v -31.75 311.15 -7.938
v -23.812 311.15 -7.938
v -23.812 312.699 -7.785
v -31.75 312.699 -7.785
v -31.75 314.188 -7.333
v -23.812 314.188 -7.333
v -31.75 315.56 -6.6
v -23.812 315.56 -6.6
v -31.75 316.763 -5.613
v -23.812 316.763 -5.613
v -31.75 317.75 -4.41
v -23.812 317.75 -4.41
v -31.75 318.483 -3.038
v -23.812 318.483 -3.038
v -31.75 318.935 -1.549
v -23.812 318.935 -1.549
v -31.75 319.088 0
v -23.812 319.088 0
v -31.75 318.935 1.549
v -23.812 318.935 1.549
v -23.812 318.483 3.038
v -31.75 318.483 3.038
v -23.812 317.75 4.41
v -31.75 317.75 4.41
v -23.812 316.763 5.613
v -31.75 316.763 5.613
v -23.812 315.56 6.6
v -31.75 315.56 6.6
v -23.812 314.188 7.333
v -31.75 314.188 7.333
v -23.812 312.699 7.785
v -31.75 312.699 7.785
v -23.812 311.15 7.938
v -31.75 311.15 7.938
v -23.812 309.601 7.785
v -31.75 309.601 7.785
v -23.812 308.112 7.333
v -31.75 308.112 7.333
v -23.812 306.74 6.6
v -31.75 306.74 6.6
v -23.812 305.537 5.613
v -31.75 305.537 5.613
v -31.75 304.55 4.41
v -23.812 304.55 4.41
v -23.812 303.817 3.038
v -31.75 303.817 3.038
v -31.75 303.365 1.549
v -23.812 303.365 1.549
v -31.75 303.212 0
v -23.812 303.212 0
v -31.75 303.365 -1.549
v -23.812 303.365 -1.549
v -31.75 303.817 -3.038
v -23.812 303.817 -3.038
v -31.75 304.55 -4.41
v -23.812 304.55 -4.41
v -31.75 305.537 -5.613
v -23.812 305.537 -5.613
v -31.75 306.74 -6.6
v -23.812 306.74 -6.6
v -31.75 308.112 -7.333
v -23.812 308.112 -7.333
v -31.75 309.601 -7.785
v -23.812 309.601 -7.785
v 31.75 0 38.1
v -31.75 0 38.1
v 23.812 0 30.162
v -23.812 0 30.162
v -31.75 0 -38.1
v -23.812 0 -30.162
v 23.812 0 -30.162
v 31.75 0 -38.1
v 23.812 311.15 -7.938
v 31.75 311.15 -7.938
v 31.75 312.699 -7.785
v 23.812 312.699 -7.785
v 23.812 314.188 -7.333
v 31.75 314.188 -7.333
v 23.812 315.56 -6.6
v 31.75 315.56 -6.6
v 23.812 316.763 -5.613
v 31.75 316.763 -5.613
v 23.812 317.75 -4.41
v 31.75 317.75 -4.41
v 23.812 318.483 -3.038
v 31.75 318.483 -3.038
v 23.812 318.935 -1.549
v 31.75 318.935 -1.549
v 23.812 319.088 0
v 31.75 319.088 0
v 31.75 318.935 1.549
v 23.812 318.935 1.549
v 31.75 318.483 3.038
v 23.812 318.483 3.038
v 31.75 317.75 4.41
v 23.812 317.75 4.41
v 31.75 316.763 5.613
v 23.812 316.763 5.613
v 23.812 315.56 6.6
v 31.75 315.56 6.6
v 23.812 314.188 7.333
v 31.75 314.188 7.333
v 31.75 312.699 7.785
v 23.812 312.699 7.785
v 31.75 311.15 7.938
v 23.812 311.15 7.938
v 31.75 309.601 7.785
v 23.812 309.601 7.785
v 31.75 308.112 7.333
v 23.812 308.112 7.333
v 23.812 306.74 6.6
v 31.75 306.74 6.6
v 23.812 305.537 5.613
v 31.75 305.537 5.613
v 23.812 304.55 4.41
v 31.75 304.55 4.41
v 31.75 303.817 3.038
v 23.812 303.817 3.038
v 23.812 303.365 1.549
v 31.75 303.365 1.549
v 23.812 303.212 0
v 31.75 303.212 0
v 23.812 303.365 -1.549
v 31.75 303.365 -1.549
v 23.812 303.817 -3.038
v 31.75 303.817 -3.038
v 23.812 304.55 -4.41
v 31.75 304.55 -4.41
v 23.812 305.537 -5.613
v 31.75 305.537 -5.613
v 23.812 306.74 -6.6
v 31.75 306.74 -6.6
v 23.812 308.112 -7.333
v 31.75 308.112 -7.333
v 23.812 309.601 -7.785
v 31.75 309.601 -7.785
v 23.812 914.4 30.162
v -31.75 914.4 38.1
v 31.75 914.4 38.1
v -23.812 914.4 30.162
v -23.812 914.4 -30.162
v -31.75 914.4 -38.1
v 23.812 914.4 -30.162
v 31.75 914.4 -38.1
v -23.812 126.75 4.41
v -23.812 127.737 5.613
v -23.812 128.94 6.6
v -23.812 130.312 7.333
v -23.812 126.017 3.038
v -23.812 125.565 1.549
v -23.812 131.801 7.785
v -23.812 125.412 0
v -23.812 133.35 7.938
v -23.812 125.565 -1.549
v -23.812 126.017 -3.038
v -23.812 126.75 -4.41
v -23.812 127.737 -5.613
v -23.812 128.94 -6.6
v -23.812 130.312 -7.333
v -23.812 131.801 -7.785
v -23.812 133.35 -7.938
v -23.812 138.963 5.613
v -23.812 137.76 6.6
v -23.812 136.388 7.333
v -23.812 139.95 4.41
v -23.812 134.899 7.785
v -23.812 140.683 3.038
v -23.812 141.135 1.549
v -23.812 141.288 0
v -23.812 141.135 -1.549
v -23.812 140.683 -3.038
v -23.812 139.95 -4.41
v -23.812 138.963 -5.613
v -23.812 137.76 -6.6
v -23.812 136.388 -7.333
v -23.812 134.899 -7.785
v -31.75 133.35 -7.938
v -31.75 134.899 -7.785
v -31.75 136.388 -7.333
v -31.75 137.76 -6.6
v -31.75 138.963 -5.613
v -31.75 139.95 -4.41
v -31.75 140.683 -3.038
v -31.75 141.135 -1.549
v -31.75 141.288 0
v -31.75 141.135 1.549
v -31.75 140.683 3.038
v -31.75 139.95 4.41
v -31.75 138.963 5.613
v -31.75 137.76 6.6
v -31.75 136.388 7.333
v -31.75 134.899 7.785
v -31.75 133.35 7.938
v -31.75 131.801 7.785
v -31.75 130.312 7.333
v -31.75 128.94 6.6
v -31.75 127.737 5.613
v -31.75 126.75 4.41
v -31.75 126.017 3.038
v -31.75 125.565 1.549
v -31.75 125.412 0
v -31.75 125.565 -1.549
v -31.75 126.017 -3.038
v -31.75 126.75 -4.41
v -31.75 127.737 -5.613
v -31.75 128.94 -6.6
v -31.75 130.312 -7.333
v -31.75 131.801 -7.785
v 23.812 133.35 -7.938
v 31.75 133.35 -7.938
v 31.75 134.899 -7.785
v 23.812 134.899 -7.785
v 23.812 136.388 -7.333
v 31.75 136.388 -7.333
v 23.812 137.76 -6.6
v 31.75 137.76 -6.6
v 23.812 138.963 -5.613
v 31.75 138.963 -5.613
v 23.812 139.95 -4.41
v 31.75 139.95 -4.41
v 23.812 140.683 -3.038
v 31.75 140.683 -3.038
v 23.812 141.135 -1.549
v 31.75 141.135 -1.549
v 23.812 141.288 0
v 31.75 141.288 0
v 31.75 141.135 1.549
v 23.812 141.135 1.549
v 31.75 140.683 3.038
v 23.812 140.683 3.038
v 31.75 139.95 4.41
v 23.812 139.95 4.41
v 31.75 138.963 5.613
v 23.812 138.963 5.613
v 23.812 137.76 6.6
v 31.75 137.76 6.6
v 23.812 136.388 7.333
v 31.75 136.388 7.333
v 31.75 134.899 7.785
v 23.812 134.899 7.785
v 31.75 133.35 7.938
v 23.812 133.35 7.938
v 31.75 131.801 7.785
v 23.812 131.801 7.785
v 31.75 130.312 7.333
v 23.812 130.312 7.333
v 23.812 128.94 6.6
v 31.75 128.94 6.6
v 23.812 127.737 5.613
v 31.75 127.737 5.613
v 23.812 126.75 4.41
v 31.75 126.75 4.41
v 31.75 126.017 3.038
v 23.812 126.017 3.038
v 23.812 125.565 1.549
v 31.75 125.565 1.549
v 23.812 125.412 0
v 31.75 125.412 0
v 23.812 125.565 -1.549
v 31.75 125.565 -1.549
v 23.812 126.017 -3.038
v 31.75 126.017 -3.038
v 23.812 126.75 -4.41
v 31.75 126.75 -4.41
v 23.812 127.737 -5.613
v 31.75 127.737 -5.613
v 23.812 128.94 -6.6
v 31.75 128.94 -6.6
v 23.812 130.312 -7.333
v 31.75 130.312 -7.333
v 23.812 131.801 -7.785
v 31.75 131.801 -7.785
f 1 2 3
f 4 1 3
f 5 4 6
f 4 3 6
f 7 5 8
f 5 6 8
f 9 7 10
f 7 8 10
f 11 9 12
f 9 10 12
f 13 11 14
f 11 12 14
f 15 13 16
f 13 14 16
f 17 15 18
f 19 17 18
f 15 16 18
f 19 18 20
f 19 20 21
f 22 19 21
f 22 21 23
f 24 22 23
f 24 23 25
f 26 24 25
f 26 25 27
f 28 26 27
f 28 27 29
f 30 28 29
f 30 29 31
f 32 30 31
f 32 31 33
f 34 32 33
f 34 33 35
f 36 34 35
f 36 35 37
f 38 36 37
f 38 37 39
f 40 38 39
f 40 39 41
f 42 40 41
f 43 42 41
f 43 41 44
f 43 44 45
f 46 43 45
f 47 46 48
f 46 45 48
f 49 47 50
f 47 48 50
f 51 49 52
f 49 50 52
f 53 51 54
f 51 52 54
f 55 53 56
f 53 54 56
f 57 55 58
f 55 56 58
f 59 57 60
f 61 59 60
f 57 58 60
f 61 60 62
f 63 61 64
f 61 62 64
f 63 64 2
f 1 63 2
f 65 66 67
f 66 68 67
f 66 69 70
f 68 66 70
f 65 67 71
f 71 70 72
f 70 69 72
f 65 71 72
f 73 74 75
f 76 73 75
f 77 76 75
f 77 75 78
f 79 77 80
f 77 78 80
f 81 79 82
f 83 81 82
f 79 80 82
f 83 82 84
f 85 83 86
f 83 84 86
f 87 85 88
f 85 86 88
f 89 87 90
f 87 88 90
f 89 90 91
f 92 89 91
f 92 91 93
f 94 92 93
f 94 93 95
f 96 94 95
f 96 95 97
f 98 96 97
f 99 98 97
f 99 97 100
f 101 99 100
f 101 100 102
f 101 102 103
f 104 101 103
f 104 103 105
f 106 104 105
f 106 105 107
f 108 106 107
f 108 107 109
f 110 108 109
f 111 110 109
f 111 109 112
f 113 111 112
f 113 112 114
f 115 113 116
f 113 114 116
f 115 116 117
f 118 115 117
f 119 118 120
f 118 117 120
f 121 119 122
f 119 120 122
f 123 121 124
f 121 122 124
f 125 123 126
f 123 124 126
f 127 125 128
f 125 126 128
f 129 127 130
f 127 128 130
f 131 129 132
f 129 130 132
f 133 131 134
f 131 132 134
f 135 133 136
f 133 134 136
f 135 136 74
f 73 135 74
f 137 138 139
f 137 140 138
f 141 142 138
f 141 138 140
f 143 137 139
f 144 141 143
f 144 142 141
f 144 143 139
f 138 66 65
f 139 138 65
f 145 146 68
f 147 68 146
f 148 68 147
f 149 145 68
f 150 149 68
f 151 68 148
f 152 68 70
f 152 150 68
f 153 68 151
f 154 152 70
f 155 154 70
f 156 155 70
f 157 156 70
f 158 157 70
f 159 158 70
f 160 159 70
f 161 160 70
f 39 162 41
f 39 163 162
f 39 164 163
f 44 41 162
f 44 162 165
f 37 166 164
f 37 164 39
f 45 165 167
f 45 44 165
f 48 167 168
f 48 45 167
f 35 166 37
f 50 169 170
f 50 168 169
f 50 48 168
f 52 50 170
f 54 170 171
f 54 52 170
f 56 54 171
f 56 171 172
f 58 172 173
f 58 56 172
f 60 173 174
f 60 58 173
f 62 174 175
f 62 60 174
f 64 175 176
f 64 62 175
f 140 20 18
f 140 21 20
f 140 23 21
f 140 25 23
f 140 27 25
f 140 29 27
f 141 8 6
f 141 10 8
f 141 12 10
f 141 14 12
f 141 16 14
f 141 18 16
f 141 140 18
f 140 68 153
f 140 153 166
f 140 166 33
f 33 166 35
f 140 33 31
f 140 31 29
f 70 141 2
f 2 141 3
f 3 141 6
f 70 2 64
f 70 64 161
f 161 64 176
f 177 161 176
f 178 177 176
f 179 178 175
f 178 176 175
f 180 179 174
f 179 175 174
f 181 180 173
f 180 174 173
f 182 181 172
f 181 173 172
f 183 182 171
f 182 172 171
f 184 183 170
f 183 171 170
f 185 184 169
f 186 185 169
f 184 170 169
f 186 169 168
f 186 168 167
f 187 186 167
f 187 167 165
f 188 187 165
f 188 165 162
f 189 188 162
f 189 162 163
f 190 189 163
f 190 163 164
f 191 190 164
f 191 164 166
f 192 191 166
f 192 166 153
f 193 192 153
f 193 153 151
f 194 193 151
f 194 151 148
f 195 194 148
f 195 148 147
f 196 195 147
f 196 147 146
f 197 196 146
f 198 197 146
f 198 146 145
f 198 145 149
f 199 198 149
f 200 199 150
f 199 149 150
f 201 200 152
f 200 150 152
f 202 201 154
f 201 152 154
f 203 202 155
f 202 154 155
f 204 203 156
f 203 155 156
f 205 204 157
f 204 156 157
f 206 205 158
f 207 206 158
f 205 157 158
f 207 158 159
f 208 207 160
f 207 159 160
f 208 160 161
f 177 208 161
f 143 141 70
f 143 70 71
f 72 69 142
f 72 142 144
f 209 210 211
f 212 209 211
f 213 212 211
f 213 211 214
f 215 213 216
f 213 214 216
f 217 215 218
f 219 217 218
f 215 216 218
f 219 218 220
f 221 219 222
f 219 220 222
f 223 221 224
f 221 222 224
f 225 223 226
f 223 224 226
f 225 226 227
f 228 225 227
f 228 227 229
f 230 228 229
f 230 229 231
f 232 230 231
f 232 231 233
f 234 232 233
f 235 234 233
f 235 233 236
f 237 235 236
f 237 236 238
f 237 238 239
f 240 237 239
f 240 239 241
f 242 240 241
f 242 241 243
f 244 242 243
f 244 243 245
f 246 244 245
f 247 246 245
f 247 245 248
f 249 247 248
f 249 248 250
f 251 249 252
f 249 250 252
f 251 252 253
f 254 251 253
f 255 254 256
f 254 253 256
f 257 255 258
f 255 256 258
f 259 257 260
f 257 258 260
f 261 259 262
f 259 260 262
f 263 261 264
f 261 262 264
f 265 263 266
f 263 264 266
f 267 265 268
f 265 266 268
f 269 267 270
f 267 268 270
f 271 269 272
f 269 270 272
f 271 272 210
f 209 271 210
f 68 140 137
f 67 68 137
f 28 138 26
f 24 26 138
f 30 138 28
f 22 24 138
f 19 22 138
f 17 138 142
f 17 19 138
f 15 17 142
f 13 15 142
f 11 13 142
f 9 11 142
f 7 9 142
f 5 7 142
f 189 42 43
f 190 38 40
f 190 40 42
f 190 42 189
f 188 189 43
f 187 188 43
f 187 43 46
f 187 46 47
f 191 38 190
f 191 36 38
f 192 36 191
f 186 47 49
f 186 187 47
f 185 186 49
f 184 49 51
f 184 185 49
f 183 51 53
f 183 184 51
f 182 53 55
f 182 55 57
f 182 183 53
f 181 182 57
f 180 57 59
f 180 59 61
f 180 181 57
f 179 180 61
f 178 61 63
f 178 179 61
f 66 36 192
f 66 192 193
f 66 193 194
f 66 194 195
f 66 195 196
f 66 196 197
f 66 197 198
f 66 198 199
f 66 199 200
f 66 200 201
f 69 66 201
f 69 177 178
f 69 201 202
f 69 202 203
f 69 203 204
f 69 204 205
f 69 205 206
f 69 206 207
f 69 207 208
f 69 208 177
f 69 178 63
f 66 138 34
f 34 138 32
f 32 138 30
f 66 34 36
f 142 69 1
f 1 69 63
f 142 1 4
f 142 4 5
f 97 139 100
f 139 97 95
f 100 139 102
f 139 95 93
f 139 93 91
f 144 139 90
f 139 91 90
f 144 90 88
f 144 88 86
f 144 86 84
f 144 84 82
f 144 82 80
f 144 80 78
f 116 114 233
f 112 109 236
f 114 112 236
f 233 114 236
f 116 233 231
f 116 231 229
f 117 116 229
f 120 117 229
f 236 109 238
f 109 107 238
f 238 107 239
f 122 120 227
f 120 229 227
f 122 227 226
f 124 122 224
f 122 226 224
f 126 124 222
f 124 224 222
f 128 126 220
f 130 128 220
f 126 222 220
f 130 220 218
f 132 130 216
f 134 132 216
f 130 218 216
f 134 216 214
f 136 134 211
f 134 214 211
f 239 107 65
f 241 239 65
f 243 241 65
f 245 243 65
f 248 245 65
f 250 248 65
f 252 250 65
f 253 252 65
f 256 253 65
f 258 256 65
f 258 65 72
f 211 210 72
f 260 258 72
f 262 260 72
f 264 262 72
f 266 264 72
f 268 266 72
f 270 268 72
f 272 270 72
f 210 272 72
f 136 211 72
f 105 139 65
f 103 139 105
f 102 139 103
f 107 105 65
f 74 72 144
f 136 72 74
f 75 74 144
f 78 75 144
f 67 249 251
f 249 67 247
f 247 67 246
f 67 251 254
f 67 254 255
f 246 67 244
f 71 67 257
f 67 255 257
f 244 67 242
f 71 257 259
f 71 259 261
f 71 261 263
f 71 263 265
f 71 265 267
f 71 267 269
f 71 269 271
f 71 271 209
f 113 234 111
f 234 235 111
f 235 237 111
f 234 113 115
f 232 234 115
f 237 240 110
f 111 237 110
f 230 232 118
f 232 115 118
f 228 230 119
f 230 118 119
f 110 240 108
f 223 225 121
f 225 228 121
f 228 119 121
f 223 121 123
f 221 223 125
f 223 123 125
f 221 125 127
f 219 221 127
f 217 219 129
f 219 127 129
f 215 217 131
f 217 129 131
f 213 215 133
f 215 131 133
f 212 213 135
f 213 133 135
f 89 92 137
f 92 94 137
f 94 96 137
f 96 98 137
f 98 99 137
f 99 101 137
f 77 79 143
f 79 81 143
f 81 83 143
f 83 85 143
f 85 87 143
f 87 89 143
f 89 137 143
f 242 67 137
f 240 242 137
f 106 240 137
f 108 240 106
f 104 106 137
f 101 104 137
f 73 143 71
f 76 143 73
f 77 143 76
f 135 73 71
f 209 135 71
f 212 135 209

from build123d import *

# Parameters (mm, degrees)
SKETCH1_W           = 63.5
SKETCH1_H           = 76.2
BOSS_EXTRUDE1_DEPTH = 914.4
SKETCH2_W           = 47.625
SKETCH2_H           = 60.325
CUT_EXTRUDE1_DEPTH  = 916.743977594
SKETCH3_R           = 7.9375
CUT_EXTRUDE2_DEPTH  = 918.393710465


with BuildPart() as part:
    # Sketch1 → Boss-Extrude1 (new body)
    with BuildSketch(Plane(origin=(0, 0, 0), x_dir=(1, 0, 0), z_dir=(0, 1, 0))):
        Rectangle(SKETCH1_W, SKETCH1_H)
    extrude(amount=BOSS_EXTRUDE1_DEPTH)

    # Sketch2 → Cut-Extrude1 (cut, through all)
    with BuildSketch(Plane(origin=(0, 914.4, 0), x_dir=(1, 0, 0), z_dir=(0, 1, 0))):
        Rectangle(SKETCH2_W, SKETCH2_H)
    extrude(amount=-CUT_EXTRUDE1_DEPTH, mode=Mode.SUBTRACT)

    # Sketch3 → Cut-Extrude2 (cut, through all)
    with BuildSketch(Plane(origin=(31.75, 0, 0), x_dir=(0, 0, -1), z_dir=(1, 0, 0))):
        with Locations((0, 311.15)):
            Circle(SKETCH3_R)
        with Locations((0, 133.35)):
            Circle(SKETCH3_R)
    extrude(amount=-CUT_EXTRUDE2_DEPTH, mode=Mode.SUBTRACT)


solid = part.part
